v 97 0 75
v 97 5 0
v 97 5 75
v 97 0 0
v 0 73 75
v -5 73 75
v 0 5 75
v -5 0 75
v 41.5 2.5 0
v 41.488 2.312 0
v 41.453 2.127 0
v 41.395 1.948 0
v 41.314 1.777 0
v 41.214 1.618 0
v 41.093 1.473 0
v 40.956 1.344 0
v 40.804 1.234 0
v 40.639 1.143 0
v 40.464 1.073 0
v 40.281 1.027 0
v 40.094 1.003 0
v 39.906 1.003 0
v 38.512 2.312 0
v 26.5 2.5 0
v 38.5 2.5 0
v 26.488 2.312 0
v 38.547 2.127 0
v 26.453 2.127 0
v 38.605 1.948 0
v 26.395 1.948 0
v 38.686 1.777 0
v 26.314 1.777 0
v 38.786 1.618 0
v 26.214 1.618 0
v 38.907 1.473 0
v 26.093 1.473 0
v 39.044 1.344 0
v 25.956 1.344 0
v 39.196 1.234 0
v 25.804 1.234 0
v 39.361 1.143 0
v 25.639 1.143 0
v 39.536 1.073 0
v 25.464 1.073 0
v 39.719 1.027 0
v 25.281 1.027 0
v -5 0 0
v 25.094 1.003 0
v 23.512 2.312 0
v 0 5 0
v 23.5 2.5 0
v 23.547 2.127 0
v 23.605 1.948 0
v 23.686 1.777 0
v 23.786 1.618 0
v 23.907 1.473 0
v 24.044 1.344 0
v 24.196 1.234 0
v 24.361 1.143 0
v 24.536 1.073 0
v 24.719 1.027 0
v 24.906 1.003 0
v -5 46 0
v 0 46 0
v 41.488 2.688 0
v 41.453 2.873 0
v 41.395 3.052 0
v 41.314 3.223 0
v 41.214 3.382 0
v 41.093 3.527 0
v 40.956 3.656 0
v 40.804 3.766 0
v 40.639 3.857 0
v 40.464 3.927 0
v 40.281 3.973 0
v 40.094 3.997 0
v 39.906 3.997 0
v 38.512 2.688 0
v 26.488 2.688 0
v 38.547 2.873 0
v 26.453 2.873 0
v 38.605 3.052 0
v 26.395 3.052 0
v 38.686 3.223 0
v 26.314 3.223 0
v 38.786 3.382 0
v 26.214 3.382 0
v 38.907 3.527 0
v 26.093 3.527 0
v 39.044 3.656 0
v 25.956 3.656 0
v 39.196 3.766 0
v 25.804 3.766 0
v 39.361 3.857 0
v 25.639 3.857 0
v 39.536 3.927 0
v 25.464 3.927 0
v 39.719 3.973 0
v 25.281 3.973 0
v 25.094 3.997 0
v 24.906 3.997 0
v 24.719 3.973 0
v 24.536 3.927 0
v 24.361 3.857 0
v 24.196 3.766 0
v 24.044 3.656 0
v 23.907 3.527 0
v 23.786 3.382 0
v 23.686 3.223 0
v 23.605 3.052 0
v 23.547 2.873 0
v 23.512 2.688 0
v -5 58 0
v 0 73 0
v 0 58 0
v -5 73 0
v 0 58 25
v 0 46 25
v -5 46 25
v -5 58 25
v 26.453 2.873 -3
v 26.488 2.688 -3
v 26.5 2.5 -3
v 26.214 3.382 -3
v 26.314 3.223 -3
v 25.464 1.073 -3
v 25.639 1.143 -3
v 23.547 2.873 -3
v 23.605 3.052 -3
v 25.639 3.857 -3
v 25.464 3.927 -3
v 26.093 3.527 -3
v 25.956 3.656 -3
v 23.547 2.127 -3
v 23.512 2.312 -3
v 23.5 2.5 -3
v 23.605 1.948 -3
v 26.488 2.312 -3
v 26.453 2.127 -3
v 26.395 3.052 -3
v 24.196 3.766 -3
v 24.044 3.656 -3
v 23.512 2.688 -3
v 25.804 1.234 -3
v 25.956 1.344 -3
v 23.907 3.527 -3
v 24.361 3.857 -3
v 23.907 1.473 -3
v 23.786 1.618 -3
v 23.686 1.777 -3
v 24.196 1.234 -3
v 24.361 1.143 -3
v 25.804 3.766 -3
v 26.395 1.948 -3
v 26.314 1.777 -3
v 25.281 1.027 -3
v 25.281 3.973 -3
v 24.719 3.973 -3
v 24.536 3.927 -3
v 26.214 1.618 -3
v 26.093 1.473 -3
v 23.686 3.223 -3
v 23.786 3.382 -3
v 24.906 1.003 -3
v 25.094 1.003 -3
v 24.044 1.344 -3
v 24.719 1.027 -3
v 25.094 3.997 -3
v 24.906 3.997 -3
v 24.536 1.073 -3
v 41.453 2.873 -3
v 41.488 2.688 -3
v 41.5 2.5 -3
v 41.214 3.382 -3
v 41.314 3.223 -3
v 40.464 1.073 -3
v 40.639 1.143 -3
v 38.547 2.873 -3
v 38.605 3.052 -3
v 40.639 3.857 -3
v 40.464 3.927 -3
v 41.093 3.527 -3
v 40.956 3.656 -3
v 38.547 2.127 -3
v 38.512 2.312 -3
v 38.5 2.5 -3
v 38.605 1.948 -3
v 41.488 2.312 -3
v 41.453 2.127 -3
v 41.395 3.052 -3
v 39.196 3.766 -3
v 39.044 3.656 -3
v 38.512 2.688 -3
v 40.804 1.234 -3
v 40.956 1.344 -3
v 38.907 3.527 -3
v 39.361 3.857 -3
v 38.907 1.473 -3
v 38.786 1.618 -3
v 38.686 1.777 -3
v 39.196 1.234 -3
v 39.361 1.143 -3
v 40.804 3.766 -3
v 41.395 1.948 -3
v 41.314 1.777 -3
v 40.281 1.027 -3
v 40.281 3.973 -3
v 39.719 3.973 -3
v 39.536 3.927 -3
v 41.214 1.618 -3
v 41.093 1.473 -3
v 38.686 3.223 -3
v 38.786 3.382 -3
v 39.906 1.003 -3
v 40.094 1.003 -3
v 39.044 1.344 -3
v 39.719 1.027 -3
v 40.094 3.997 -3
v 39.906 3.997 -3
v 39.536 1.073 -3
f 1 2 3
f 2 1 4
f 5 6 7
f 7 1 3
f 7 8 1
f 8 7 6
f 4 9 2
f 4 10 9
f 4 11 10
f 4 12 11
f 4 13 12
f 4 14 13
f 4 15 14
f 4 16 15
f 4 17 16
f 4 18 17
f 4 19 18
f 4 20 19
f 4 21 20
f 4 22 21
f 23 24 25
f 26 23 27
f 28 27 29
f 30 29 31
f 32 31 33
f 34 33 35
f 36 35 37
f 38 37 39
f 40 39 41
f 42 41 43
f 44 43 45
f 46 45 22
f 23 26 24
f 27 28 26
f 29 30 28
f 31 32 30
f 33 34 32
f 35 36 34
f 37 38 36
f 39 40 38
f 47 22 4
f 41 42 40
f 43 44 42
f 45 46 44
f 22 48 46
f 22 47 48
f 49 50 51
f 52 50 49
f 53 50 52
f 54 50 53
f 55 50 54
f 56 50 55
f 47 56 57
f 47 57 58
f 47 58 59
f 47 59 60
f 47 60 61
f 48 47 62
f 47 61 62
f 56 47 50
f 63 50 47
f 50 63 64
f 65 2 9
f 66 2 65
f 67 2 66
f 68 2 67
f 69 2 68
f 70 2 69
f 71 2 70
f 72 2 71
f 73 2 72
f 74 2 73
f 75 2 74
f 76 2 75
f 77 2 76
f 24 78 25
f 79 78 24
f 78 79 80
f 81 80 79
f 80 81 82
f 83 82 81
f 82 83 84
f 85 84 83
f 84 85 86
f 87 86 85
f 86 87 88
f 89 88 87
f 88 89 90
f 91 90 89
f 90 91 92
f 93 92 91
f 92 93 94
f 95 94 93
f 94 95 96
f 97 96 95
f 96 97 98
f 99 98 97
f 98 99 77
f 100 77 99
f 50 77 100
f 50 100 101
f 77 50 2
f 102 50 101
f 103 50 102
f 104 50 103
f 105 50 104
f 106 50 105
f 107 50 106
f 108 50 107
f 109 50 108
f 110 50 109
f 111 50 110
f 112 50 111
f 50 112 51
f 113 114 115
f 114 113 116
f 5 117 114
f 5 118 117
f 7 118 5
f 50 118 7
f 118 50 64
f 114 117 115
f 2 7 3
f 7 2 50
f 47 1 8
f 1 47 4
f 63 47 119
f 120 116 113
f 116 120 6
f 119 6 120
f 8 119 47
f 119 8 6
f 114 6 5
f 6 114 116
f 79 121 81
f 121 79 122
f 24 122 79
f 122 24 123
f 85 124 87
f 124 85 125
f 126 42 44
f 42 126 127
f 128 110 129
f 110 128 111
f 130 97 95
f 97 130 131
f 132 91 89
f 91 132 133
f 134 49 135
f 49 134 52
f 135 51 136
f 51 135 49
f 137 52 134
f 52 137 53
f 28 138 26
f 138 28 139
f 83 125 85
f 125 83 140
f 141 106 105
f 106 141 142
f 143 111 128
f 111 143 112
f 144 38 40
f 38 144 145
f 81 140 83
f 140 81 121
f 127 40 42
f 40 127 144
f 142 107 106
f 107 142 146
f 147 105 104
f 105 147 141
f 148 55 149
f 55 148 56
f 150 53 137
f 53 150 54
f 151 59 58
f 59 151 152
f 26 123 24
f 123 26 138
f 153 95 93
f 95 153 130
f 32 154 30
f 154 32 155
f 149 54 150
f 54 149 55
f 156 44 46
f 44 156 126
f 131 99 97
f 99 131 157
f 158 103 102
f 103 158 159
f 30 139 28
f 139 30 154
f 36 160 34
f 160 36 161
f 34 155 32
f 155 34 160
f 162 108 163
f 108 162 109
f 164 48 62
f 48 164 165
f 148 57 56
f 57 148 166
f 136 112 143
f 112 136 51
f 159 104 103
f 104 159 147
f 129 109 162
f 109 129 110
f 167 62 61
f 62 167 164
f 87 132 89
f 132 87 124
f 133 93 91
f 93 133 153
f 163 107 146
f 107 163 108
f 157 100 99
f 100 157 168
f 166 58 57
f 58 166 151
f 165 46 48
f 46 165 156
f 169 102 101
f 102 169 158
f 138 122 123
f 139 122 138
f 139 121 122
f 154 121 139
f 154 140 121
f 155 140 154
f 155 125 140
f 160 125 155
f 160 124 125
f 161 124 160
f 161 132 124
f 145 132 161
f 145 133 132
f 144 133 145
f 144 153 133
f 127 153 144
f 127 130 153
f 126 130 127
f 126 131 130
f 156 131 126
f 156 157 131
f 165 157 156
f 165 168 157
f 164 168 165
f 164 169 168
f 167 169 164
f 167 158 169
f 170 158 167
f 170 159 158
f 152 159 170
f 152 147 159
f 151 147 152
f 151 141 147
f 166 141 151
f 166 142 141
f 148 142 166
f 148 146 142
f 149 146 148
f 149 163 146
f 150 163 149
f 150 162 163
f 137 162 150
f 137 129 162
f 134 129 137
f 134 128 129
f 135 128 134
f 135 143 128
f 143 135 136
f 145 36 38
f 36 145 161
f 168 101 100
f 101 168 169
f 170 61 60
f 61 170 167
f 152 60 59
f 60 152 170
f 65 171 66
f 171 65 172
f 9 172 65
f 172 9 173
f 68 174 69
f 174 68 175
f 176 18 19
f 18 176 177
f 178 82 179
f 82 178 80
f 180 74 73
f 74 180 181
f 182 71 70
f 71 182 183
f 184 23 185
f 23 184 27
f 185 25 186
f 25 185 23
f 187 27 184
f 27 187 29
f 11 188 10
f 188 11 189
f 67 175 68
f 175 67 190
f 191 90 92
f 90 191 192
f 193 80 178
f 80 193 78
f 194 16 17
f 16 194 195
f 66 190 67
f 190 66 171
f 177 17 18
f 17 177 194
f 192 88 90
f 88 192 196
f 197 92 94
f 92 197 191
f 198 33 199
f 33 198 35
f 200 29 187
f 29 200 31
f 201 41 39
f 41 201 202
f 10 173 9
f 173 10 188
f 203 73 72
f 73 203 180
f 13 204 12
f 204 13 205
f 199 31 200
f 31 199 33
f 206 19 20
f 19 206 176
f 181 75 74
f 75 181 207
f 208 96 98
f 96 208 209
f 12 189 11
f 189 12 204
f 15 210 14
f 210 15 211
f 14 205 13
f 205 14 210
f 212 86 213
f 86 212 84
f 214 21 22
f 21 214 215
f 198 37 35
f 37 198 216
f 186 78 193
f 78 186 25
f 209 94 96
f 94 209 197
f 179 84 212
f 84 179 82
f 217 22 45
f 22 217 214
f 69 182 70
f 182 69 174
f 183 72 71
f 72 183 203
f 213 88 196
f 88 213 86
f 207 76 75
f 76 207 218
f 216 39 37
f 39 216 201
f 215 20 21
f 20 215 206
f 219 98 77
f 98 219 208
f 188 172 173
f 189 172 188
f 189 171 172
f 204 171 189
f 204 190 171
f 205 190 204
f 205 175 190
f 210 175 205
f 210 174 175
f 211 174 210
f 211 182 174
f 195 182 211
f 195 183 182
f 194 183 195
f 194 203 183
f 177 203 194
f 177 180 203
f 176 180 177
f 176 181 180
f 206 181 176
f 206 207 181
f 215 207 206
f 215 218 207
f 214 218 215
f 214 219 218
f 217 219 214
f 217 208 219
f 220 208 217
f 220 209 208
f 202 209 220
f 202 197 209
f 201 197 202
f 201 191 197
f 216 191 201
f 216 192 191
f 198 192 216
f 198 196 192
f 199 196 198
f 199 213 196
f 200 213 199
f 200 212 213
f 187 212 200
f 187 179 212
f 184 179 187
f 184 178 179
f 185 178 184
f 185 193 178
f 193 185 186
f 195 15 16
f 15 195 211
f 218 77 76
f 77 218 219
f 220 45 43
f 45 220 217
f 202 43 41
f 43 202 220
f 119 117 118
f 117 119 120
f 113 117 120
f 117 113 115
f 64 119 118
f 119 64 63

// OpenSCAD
//Spessore parete del corridoio, con la porta
spessore_uno=5; 
//lunghezza della prima parete
lunghezza_uno=73; 

//spessore parete divisoria degli ambienti
spessore_due=5;
lunghezza_due = 97; 
//
//altezza uguale per tutte le pareti
altezza=75; 


//dati relativi alla porta
altezza_porta = 25; 
larghezza_porta = 12;
//distanza della porta a partire dall'angolo esterno
distanza_porta = 46;

//parametri relativi alle finestre, ma non ancora inseriti nel modello
lunghezza_fin=15;
 altezza_fin=11;

due_pareti_porta();

module due_pareti(){
   union(){
    cube([lunghezza_due, spessore_due, altezza]);
   rotate([0,0,90])    cube([lunghezza_uno, spessore_uno, altezza]);
    translate([25,spessore_uno/2,-3])cylinder(10, 1.5,1.5, $fn=50);
    translate([40,spessore_uno/2,-3])cylinder(10, 1.5,1.5, $fn=50);
   }
}


module due_pareti_porta(){
    
    difference(){
        due_pareti();
        translate([-spessore_due,distanza_porta,0]) cube([spessore_due,larghezza_porta,altezza_porta]);
    }
}

module finestra(){
    
    cube([lunghezza_fin, spessore, altezza_fin]);
    
    }
    
    
    
